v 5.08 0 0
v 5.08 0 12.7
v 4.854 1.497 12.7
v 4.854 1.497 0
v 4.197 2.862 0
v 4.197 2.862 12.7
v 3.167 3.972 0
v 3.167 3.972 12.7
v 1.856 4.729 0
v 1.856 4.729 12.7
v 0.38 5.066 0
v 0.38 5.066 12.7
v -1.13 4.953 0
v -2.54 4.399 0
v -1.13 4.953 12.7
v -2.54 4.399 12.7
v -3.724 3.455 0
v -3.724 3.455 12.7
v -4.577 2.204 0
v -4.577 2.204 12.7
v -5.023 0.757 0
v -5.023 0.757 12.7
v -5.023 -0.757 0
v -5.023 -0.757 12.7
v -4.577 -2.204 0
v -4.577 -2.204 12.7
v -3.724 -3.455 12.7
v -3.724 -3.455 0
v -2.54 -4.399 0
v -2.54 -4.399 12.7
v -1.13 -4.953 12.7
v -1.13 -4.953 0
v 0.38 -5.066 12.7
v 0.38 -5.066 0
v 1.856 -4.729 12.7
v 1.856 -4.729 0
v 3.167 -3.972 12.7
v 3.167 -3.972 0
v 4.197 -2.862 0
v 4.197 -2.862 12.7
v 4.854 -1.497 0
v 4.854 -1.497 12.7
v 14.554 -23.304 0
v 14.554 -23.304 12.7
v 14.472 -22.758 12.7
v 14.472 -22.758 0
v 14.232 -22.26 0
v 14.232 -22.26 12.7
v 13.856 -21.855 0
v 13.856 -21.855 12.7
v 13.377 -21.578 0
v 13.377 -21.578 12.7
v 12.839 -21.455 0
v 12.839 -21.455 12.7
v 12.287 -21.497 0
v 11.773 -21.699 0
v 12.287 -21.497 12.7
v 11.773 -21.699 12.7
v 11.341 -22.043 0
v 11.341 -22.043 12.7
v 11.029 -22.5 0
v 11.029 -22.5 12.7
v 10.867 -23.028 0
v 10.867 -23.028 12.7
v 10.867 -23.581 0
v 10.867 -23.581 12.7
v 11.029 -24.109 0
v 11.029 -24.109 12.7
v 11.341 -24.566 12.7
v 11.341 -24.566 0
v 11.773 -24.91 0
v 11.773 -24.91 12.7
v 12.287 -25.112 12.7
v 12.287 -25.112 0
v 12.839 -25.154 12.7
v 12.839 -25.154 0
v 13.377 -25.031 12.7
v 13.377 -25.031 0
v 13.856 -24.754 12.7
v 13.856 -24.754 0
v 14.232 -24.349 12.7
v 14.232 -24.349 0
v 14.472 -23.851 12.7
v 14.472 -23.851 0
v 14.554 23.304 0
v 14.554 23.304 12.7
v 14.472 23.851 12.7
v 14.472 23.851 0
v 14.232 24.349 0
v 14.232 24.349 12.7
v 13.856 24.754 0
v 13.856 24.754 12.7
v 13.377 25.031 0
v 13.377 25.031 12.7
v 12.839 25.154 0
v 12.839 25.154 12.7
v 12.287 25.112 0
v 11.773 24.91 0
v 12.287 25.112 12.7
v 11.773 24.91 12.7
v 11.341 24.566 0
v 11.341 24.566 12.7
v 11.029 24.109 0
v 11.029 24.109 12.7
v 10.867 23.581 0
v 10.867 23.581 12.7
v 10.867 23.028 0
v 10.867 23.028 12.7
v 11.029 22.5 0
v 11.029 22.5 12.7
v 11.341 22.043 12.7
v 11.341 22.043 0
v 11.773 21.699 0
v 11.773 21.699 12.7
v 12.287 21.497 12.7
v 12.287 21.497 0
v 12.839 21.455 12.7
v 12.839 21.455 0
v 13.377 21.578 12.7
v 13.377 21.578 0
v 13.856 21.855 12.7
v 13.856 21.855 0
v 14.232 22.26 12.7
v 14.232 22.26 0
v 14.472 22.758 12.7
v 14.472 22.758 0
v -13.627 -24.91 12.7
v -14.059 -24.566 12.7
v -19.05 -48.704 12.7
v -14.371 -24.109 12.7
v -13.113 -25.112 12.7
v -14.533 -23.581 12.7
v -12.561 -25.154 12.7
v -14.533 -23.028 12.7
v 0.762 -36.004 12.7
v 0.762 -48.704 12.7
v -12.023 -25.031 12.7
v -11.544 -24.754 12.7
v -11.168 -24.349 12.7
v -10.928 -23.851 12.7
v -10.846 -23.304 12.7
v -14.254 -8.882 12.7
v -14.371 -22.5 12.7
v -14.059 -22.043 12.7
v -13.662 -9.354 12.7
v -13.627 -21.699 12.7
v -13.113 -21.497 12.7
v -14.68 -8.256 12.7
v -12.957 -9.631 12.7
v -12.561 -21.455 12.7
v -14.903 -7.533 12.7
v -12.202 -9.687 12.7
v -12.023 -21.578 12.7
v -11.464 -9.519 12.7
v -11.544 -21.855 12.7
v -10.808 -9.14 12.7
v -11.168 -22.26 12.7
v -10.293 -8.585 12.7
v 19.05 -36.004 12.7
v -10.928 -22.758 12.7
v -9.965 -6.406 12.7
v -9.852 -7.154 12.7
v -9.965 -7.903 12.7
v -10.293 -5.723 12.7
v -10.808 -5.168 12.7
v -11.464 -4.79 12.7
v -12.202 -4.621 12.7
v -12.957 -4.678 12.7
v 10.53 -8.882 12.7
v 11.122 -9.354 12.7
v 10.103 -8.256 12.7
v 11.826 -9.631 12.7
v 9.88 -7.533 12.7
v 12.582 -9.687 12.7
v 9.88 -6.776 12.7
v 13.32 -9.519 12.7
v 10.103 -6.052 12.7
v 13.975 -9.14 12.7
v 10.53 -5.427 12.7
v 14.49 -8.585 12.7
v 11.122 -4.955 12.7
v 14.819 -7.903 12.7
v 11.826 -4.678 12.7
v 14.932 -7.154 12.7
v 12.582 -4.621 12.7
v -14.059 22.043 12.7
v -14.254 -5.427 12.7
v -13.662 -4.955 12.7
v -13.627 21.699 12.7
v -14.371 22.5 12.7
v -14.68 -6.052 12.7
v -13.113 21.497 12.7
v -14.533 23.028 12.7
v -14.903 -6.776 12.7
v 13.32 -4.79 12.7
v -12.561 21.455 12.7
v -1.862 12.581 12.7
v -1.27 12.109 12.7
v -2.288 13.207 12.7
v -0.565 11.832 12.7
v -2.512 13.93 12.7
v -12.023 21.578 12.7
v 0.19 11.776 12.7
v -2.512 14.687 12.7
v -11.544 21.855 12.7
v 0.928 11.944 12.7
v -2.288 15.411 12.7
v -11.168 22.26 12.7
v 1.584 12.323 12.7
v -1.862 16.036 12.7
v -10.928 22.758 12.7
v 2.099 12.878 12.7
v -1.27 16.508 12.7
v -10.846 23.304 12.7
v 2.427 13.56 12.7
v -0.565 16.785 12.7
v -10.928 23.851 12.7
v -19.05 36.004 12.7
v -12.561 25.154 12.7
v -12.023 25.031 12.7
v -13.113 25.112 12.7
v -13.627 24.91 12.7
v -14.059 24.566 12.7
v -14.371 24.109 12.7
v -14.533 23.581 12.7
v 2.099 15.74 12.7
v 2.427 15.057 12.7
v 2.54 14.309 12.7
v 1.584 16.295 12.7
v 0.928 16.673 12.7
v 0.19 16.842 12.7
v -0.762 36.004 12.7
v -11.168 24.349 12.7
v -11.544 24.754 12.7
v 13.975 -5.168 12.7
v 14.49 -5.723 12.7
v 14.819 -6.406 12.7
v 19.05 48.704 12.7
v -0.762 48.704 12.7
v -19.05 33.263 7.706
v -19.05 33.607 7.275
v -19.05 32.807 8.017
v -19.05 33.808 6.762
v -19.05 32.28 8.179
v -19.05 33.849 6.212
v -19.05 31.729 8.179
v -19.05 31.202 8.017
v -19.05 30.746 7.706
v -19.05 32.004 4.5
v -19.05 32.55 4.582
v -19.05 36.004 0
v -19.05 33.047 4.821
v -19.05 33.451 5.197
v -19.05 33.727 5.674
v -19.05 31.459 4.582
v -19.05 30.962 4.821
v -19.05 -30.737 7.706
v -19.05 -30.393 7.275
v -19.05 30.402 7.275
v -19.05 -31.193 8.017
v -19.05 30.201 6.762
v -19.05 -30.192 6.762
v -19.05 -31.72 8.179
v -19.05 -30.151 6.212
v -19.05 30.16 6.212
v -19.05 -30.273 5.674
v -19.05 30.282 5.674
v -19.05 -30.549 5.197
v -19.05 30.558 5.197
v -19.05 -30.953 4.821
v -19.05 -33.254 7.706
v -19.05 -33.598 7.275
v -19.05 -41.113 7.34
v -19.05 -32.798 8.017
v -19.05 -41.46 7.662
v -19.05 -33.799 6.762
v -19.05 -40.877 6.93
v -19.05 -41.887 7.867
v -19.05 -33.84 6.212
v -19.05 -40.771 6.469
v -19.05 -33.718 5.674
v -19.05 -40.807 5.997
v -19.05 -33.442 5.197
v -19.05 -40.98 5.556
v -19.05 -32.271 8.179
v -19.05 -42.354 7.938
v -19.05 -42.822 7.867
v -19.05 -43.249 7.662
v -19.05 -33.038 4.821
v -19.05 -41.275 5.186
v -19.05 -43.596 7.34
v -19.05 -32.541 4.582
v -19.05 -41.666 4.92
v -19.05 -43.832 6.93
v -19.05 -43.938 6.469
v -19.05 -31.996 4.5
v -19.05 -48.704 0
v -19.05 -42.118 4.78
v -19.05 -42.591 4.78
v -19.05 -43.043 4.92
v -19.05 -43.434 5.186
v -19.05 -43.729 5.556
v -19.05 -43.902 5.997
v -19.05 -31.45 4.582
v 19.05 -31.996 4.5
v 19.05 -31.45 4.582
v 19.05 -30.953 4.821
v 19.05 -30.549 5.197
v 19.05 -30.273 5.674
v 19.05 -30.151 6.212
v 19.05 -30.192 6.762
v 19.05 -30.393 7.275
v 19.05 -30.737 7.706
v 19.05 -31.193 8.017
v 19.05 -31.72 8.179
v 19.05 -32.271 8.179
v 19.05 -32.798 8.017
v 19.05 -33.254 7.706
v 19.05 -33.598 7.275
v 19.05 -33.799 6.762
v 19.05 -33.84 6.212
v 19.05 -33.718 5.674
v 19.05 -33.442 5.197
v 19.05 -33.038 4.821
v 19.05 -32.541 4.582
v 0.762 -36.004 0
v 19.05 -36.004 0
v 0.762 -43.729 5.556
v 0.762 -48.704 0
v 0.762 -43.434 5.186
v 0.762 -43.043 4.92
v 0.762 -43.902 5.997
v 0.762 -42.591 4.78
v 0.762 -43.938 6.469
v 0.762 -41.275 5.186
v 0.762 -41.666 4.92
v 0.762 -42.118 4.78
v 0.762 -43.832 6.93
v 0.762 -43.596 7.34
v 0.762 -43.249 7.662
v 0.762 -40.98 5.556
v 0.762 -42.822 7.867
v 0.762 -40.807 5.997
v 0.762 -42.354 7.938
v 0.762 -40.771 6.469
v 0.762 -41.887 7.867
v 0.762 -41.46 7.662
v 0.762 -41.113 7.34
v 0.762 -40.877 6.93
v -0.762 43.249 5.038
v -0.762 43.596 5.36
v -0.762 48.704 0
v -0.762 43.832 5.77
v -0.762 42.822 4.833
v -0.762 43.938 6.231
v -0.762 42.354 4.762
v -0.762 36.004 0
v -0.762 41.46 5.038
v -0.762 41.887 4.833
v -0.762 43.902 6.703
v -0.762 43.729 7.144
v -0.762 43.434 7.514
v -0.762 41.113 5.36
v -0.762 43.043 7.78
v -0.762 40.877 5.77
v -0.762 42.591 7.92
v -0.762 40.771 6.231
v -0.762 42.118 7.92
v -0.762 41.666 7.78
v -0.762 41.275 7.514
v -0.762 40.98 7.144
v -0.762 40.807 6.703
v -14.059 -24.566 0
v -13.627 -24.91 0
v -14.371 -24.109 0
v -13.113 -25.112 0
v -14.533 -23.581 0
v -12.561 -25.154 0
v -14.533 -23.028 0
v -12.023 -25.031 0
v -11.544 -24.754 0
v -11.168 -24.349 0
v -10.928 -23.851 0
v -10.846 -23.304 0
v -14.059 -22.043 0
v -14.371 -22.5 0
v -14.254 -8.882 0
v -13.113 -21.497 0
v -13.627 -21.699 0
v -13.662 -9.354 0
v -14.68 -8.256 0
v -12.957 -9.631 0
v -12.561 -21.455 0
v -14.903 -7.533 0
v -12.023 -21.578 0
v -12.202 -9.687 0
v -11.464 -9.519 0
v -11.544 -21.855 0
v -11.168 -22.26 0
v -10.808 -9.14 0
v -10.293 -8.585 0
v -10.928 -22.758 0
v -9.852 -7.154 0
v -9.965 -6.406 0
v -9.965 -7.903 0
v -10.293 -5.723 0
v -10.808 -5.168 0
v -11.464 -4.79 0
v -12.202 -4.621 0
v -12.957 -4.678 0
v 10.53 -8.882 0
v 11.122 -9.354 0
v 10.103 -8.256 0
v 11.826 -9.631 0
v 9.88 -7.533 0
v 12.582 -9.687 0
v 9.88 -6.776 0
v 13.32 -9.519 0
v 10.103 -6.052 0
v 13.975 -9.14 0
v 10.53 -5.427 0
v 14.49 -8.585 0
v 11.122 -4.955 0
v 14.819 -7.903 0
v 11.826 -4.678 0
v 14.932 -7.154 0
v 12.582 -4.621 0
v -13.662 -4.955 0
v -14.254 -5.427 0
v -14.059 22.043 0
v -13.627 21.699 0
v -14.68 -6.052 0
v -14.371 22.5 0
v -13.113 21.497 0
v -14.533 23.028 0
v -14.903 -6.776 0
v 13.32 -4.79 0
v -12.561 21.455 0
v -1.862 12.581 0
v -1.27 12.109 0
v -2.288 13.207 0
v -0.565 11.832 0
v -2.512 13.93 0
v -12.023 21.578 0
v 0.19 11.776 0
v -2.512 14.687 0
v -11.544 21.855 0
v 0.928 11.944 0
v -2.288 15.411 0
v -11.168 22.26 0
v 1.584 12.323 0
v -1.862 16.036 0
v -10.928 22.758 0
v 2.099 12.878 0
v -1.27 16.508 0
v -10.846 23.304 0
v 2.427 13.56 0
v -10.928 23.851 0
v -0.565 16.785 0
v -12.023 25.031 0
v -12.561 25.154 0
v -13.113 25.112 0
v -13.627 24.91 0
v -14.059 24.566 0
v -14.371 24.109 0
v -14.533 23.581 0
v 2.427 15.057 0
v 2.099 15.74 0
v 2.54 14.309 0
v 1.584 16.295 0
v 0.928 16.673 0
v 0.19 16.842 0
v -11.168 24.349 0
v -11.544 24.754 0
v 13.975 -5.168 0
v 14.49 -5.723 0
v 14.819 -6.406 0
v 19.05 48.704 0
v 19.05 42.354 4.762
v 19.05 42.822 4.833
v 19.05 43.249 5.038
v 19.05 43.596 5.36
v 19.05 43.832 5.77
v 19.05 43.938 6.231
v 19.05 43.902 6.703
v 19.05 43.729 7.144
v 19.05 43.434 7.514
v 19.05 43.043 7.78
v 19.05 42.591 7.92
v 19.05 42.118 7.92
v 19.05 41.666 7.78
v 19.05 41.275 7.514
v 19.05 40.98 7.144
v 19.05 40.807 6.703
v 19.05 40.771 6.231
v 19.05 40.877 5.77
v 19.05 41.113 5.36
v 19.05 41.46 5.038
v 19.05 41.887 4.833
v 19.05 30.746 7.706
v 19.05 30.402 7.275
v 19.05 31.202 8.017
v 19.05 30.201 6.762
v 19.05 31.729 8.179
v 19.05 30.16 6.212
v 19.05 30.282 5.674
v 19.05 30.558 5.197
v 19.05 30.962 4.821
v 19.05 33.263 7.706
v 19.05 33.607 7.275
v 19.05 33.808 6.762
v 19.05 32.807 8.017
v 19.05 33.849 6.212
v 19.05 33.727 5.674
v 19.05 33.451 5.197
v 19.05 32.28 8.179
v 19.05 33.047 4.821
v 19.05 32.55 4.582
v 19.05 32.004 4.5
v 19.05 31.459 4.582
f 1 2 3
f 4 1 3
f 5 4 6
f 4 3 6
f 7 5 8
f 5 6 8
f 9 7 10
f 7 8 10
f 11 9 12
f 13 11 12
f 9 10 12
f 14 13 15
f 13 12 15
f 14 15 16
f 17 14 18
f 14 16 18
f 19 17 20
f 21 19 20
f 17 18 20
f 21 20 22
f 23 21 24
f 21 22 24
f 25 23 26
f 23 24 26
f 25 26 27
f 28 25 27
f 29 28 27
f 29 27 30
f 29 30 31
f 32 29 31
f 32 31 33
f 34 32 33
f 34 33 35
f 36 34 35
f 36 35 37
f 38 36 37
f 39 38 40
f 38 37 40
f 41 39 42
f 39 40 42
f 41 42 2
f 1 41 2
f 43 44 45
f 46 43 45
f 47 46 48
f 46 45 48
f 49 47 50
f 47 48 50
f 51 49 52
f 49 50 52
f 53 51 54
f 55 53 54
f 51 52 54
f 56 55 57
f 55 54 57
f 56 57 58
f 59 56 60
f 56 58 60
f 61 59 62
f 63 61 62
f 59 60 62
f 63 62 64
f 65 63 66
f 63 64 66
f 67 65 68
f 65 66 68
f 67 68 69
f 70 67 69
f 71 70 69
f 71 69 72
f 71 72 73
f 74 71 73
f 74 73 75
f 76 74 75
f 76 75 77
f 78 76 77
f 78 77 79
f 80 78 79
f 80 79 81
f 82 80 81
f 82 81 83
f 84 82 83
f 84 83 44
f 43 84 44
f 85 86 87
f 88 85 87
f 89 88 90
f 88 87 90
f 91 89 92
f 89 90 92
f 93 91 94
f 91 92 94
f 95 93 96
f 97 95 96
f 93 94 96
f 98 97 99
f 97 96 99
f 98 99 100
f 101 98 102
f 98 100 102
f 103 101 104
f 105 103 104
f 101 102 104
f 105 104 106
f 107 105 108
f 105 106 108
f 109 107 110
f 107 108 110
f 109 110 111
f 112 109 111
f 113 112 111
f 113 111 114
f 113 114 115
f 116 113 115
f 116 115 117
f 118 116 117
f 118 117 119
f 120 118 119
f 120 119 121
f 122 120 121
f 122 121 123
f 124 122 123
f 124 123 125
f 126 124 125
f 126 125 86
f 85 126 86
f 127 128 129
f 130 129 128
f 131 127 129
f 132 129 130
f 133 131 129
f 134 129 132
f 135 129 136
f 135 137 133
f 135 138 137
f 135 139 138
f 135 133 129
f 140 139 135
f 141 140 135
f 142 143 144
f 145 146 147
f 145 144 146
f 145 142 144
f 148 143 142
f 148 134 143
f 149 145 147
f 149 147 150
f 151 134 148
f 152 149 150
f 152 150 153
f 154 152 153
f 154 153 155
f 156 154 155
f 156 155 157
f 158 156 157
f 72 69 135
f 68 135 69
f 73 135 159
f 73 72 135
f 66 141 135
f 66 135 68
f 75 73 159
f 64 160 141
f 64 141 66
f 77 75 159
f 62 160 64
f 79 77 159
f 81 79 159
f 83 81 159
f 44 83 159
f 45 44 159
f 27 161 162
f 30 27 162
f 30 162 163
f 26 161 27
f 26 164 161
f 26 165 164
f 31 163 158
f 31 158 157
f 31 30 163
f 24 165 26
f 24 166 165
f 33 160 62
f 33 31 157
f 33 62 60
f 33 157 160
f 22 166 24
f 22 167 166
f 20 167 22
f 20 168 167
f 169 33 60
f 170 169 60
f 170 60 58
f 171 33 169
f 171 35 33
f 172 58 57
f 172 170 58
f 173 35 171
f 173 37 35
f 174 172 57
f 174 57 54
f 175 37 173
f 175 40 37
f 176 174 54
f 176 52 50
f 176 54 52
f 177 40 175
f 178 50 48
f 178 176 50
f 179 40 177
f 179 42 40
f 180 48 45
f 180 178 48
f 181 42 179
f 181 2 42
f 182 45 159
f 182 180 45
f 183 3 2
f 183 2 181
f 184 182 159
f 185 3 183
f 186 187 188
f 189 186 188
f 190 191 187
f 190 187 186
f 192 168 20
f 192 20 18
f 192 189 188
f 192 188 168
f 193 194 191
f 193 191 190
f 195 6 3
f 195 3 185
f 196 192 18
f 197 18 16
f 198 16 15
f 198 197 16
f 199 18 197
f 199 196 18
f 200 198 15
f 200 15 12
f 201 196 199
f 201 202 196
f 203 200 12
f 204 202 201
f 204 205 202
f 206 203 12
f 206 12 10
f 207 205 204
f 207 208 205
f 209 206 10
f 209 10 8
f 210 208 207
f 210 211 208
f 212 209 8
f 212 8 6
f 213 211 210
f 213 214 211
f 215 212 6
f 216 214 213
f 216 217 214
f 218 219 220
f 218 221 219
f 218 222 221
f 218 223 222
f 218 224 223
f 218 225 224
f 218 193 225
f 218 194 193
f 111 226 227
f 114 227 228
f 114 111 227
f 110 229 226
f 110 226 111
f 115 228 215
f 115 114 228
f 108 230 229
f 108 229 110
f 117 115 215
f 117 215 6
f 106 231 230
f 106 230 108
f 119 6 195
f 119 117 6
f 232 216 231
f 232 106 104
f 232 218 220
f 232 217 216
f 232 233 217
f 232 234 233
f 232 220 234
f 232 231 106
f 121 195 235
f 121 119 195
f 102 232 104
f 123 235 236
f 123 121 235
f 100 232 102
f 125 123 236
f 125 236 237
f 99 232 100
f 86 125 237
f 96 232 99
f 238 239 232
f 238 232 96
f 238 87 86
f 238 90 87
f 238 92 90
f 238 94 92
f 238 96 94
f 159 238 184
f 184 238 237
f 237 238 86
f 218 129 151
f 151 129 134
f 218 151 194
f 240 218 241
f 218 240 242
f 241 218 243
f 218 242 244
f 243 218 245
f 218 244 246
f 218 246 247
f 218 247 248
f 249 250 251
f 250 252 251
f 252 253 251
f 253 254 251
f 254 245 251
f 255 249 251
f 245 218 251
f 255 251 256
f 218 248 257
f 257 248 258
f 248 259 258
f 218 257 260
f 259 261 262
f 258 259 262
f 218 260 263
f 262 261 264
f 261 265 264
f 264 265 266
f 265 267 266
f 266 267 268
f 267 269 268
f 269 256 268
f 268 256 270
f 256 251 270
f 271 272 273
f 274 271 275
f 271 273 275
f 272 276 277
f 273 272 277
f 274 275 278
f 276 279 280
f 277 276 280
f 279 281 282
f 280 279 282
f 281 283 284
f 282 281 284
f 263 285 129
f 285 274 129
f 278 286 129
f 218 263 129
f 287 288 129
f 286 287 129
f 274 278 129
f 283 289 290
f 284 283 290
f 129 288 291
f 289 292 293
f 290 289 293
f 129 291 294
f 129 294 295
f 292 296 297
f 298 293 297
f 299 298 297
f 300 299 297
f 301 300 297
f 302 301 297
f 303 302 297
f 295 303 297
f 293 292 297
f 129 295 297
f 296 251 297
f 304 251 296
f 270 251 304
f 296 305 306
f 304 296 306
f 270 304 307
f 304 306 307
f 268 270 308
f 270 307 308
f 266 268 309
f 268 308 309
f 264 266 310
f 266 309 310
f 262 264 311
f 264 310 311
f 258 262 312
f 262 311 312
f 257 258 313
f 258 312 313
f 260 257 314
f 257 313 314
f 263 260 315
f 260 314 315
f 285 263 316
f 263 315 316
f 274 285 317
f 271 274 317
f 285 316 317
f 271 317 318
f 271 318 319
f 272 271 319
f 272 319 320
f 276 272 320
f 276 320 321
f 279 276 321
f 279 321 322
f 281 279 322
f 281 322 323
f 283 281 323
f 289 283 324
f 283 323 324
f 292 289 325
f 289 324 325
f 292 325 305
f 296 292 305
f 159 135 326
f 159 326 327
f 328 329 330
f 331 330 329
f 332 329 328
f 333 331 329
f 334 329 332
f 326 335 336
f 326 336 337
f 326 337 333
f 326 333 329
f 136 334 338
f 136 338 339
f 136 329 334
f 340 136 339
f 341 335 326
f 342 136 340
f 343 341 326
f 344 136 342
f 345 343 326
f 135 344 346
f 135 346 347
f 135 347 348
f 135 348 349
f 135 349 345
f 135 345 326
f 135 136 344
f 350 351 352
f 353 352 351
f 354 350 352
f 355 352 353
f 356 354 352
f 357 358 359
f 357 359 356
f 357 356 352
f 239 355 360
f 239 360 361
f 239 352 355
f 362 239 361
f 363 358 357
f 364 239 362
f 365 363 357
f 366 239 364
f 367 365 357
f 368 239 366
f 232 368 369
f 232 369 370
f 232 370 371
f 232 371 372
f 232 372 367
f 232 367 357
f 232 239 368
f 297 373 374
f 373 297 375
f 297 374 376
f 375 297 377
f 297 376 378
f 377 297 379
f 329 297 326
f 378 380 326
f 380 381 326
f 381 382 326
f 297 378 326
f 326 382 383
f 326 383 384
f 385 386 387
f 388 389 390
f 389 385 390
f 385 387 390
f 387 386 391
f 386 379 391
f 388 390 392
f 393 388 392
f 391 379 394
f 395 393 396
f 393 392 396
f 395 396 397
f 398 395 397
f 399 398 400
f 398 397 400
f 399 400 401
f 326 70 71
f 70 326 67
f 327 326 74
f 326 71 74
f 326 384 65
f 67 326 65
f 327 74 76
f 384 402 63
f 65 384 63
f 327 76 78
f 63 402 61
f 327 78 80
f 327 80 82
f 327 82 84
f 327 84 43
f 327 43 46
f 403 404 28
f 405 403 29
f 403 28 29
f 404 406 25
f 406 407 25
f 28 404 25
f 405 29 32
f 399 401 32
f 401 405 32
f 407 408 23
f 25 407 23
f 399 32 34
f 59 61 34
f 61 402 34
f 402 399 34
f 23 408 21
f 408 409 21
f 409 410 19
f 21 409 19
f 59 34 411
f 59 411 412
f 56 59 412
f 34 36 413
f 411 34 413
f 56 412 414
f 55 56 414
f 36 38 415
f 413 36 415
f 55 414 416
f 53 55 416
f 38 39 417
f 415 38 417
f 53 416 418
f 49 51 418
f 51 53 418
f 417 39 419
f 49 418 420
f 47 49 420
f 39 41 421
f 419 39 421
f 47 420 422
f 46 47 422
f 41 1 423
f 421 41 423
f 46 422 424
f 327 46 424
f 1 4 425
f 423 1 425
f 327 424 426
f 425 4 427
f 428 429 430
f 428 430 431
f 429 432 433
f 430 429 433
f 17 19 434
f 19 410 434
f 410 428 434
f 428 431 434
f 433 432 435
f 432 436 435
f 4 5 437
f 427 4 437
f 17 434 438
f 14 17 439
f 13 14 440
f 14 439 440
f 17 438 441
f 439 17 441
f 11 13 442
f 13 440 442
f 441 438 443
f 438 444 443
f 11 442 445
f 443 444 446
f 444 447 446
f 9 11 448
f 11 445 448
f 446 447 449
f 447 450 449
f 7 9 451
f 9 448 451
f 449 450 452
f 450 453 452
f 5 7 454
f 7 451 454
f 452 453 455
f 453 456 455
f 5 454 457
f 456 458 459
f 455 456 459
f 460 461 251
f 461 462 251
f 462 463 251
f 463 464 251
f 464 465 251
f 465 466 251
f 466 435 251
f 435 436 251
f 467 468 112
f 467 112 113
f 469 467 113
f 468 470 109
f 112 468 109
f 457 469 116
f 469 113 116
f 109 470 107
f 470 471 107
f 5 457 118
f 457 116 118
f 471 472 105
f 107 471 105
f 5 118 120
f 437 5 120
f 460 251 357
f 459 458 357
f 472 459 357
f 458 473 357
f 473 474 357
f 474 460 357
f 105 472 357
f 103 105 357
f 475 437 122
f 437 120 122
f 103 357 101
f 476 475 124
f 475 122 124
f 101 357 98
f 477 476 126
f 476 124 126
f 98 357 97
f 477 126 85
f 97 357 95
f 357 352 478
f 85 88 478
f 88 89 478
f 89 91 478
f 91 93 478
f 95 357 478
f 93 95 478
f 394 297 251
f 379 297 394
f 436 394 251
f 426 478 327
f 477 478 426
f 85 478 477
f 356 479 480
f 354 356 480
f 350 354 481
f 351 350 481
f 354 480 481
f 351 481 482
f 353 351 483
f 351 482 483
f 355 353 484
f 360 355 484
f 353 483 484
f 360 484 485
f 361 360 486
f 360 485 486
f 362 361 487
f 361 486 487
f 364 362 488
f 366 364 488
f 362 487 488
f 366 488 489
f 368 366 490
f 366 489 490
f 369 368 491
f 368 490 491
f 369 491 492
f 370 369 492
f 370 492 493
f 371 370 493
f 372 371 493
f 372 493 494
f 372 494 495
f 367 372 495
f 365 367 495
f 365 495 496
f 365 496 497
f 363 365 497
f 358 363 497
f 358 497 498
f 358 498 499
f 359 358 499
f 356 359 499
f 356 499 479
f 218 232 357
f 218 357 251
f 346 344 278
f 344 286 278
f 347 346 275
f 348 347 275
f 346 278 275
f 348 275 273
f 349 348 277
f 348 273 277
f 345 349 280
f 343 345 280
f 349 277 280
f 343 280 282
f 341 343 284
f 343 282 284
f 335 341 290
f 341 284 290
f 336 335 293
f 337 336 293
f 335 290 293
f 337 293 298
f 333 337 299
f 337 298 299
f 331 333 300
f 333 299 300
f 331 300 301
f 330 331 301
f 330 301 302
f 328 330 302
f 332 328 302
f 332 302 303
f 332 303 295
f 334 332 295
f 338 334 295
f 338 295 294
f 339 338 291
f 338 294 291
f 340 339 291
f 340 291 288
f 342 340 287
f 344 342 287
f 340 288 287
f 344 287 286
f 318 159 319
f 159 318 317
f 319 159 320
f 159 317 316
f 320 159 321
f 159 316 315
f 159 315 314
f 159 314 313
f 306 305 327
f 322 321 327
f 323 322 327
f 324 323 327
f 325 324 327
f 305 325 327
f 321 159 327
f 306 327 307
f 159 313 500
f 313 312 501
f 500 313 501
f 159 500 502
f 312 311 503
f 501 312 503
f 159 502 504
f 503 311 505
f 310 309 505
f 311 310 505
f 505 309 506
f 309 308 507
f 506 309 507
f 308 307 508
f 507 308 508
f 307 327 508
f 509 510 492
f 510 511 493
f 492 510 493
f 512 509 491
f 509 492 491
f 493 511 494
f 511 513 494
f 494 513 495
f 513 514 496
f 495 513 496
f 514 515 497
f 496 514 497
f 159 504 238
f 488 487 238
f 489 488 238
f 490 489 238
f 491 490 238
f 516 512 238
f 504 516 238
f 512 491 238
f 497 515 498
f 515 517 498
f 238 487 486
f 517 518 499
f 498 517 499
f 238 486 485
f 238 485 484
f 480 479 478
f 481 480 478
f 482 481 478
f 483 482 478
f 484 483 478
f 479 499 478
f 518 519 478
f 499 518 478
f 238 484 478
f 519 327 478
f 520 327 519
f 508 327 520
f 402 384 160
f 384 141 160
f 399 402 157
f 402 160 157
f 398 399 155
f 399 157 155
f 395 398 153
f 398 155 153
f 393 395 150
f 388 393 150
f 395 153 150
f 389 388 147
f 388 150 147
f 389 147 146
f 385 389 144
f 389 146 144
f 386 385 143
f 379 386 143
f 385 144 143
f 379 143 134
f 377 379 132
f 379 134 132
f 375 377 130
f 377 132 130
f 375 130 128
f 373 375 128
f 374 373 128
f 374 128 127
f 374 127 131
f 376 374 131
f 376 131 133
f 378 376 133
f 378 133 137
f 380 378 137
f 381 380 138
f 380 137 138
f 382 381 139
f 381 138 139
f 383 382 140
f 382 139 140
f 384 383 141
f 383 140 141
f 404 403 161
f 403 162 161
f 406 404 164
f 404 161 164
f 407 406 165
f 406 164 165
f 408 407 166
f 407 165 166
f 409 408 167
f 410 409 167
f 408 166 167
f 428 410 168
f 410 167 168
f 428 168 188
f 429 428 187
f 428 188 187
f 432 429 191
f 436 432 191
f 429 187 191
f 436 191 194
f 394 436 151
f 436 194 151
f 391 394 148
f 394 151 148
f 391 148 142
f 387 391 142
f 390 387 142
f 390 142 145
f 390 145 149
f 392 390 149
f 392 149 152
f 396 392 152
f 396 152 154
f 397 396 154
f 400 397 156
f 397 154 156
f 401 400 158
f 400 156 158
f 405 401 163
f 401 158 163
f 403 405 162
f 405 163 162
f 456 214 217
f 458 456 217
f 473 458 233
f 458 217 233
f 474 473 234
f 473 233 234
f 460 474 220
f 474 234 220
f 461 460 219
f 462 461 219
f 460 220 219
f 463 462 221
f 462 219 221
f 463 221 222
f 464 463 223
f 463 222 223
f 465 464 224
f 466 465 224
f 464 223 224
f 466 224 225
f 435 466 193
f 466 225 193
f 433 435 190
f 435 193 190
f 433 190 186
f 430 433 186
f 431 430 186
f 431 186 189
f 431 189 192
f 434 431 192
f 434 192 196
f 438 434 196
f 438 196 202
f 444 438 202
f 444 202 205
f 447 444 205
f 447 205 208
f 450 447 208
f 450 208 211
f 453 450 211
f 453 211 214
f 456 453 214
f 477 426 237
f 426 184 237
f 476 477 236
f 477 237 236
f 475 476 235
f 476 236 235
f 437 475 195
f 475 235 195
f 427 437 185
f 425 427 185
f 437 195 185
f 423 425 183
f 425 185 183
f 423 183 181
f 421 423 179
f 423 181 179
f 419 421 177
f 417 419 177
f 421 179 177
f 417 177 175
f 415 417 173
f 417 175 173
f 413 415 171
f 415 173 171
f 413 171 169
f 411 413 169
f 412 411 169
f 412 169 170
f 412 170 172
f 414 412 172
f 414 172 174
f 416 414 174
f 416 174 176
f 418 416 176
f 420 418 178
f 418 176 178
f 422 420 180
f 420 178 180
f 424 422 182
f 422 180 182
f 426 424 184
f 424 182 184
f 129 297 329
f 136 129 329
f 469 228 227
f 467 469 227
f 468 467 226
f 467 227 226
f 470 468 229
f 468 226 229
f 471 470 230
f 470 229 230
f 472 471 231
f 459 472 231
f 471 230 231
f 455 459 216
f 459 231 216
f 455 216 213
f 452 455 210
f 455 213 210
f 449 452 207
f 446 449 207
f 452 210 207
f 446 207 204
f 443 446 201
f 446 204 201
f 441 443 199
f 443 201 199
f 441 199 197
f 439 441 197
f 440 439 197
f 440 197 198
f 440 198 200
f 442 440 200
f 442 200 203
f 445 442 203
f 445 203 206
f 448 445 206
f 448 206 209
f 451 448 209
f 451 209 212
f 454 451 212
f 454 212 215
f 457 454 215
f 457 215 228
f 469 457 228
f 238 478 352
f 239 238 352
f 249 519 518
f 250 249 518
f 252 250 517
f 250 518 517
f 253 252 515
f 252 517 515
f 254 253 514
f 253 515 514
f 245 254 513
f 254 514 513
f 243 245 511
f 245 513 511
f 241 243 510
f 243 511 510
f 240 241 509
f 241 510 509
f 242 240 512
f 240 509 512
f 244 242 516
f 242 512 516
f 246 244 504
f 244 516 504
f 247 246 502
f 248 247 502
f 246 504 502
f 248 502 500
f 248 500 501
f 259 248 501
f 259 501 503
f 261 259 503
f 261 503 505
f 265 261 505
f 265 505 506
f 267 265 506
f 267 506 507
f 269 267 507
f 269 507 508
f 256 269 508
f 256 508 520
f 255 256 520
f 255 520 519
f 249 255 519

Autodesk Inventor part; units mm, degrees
ref_plane "YZ Plane" through (0, 0, 0) normal (1, 0, 0) x (0, 1, 0)
ref_plane "XZ Plane" through (0, 0, 0) normal (0, 1, 0) x (-1, 0, 0)
ref_plane "XY Plane" through (0, 0, 0) normal (0, 0, 1) x (1, 0, 0)
sketch "Sketch1" plane through (0, 0, 0) normal (0, 0, 1) x (1, 0, 0)
  line L0 (-19.05, -48.7045) -> (19.05, -48.7045)
  line L1 (19.05, -48.7045) -> (19.05, 48.7045)
  line L2 (19.05, 48.7045) -> (-19.05, 48.7045)
  line L3 (-19.05, 48.7045) -> (-19.05, -48.7045)
  line L4 (-19.05, -48.7045) -> (19.05, 48.7045) construction
  line L5 (19.05, -48.7045) -> (-19.05, 48.7045) construction
  point P0 (0, 0)
  dimension "d0" = 38.1
  dimension "d1" = 97.409
extrude "Extrusion1" add sketch "Sketch1" along normal blind 12.7
sketch "Sketch2" plane through (0, 0, 12.7) normal (0, 0, 1) x (1, 0, 0)
  line L0 (-19.05, 48.7045) -> (-0.762, 48.7045)
  line L1 (-0.762, 48.7045) -> (-0.762, 36.0045)
  line L2 (-0.762, 36.0045) -> (-19.05, 36.0045)
  line L3 (-19.05, 36.0045) -> (-19.05, 48.7045)
  point P0 (0, 0)
  dimension "d4" = 18.288
  dimension "d5" = 12.7
extrude "Extrusion2" cut sketch "Sketch2" against normal blind 12.7
sketch "Sketch3" plane through (0, 0, 12.7) normal (0, 0, 1) x (1, 0, 0)
  line L0 (19.05, -48.7045) -> (0.762, -48.7045)
  line L1 (0.762, -48.7045) -> (0.762, -36.0045)
  line L2 (0.762, -36.0045) -> (19.05, -36.0045)
  line L3 (19.05, -36.0045) -> (19.05, -48.7045)
  point P0 (0, 0)
  dimension "d8" = 18.288
  dimension "d9" = 12.7
extrude "Extrusion3" cut sketch "Sketch3" against normal blind 12.7
sketch "Sketch4" plane through (0, 0, 12.7) normal (0, 0, 1) x (1, 0, 0)
  circle A0 centre (0, 0) radius 5.08
  dimension "d12" = 10.16
extrude "Extrusion4" cut sketch "Sketch4" against normal blind 12.7
sketch "Sketch5" plane through (19.05, 48.7045, 12.7) normal (1, 0, 0) x (0, 0, -1)
  line L0 (12.7, -97.409) -> (12.7, 0) projected
  line L1 (12.7, 0) -> (0, 0) projected
  line L2 (0, -84.709) -> (0, 0) projected
  line L3 (0, -12.7) -> (12.7, -12.7) projected
  circle A0 centre (6.35, -6.35) radius 1.5875
  point P0 (12.7, -48.7045)
  dimension "d16" = 3.175
  dimension "d17" = 6.35
  dimension "d18" = 6.35
  dimension "d19" = 6.35
  dimension "d20" = 6.35
extrude "Extrusion5" cut sketch "Sketch5" against normal blind 34.29 contours A0
sketch "Sketch9" plane through (-19.05, -48.7045, 0) normal (-1, 0, 0) x (0, 0, 1)
  line L0 (0, 0) -> (12.7, 0) projected
  line L1 (12.7, 84.709) -> (12.7, 0) projected
  line L2 (12.7, 12.709) -> (0, 12.709) projected
  circle A0 centre (6.35, 6.35) radius 1.5875
  line L3 (12.7, 12.7) -> (0, 12.7) projected
  point P0 (0, 48.7045)
  dimension "d34" = 3.175
  dimension "d35" = 6.35
  dimension "d40" = 6.35
  dimension "d41" = 6.35
extrude "Extrusion9" cut sketch "Sketch9" against normal blind 20.701
sketch "Sketch10" plane through (0, 0, 12.7) normal (0, 0, 1) x (1, 0, 0)
  circle A0 centre (0, 0) radius 5.08 projected
  line L0 (0.762, -36.0045) -> (19.05, -36.0045) projected
  line L1 (4.0695, 16.6582) -> (16.4611, -4.8048)
  line L2 (12.3917, -11.8533) -> (-12.3917, -11.8533)
  line L3 (-16.4611, -4.8048) -> (-4.0695, 16.6582)
  line L4 (-1.524, 36.0045) -> (-1.524, -36.0045) construction
  arc A1 (-16.4611, -4.8048) -> (-12.3917, -11.8533) centre (-12.3917, -7.1543) ccw
  arc A2 (4.0695, 16.6582) -> (-4.0695, 16.6582) centre (0, 14.3087) ccw
  arc A3 (12.3917, -11.8533) -> (16.4611, -4.8048) centre (12.3917, -7.1543) ccw
  circle A4 centre (-12.3917, -7.1543) radius 2.54
  circle A5 centre (0, 14.3087) radius 2.54
  circle A6 centre (12.3917, -7.1543) radius 2.54
  point P0 (-0.762, 36.0045)
  point P1 (0, 23.7067)
  point P2 (20.5306, -11.8533)
  point P3 (-20.5306, -11.8533)
  dimension "d52" = 35.56
  dimension "d53" = 4.699
  dimension "d54" = 4.699
  dimension "d55" = 5.08
  dimension "d56" = 5.08
  dimension "d57" = 5.08
extrude "Extrusion11" cut sketch "Sketch10" against normal blind 12.7 contours A4 | A5 | A6
sketch "Sketch11" plane through (19.05, 48.7045, 12.7) normal (1, 0, 0) x (0, 0, -1)
  circle A0 centre (6.35, -16.7) radius 1.85 projected
  circle A1 centre (6.35, -80.7) radius 1.85 projected
  point P0 (12.7, -48.7045)
extrude "Extrusion12" cut sketch "Sketch11" against normal blind 38.1
sketch "Sketch12" plane through (0, 0, 12.7) normal (0, 0, 1) x (1, 0, 0)
  line L0 (0.762, -36.0045) -> (19.05, -36.0045) projected
  line L1 (19.05, -36.0045) -> (19.05, 48.7045) projected
  line L2 (-0.762, 36.0045) -> (-19.05, 36.0045) projected
  line L3 (-19.05, 36.0045) -> (-19.05, -48.7045) projected
  circle A0 centre (-12.7, 23.3045) radius 1.8542
  circle A1 centre (12.7, 23.3045) radius 1.8542
  circle A2 centre (12.7, -23.3045) radius 1.8542
  circle A3 centre (-12.7, -23.3045) radius 1.8542
  dimension "d62" = 3.7084
  dimension "d64" = 6.35
  dimension "d65" = 12.7
  dimension "d66" = 3.7084
  dimension "d67" = 12.7
  dimension "d68" = 6.35
  dimension "d69" = 3.7084
  dimension "d70" = 6.35
  dimension "d71" = 12.7
  dimension "d72" = 3.7084
  dimension "d73" = 6.35
  dimension "d74" = 12.7
extrude "Extrusion13" cut sketch "Sketch12" against normal blind 12.7
equation "\"d17\" = d18"
equation "\"d19\" = d20"
equation "\"d40\" = d41"
properties part number "MotorMount"
